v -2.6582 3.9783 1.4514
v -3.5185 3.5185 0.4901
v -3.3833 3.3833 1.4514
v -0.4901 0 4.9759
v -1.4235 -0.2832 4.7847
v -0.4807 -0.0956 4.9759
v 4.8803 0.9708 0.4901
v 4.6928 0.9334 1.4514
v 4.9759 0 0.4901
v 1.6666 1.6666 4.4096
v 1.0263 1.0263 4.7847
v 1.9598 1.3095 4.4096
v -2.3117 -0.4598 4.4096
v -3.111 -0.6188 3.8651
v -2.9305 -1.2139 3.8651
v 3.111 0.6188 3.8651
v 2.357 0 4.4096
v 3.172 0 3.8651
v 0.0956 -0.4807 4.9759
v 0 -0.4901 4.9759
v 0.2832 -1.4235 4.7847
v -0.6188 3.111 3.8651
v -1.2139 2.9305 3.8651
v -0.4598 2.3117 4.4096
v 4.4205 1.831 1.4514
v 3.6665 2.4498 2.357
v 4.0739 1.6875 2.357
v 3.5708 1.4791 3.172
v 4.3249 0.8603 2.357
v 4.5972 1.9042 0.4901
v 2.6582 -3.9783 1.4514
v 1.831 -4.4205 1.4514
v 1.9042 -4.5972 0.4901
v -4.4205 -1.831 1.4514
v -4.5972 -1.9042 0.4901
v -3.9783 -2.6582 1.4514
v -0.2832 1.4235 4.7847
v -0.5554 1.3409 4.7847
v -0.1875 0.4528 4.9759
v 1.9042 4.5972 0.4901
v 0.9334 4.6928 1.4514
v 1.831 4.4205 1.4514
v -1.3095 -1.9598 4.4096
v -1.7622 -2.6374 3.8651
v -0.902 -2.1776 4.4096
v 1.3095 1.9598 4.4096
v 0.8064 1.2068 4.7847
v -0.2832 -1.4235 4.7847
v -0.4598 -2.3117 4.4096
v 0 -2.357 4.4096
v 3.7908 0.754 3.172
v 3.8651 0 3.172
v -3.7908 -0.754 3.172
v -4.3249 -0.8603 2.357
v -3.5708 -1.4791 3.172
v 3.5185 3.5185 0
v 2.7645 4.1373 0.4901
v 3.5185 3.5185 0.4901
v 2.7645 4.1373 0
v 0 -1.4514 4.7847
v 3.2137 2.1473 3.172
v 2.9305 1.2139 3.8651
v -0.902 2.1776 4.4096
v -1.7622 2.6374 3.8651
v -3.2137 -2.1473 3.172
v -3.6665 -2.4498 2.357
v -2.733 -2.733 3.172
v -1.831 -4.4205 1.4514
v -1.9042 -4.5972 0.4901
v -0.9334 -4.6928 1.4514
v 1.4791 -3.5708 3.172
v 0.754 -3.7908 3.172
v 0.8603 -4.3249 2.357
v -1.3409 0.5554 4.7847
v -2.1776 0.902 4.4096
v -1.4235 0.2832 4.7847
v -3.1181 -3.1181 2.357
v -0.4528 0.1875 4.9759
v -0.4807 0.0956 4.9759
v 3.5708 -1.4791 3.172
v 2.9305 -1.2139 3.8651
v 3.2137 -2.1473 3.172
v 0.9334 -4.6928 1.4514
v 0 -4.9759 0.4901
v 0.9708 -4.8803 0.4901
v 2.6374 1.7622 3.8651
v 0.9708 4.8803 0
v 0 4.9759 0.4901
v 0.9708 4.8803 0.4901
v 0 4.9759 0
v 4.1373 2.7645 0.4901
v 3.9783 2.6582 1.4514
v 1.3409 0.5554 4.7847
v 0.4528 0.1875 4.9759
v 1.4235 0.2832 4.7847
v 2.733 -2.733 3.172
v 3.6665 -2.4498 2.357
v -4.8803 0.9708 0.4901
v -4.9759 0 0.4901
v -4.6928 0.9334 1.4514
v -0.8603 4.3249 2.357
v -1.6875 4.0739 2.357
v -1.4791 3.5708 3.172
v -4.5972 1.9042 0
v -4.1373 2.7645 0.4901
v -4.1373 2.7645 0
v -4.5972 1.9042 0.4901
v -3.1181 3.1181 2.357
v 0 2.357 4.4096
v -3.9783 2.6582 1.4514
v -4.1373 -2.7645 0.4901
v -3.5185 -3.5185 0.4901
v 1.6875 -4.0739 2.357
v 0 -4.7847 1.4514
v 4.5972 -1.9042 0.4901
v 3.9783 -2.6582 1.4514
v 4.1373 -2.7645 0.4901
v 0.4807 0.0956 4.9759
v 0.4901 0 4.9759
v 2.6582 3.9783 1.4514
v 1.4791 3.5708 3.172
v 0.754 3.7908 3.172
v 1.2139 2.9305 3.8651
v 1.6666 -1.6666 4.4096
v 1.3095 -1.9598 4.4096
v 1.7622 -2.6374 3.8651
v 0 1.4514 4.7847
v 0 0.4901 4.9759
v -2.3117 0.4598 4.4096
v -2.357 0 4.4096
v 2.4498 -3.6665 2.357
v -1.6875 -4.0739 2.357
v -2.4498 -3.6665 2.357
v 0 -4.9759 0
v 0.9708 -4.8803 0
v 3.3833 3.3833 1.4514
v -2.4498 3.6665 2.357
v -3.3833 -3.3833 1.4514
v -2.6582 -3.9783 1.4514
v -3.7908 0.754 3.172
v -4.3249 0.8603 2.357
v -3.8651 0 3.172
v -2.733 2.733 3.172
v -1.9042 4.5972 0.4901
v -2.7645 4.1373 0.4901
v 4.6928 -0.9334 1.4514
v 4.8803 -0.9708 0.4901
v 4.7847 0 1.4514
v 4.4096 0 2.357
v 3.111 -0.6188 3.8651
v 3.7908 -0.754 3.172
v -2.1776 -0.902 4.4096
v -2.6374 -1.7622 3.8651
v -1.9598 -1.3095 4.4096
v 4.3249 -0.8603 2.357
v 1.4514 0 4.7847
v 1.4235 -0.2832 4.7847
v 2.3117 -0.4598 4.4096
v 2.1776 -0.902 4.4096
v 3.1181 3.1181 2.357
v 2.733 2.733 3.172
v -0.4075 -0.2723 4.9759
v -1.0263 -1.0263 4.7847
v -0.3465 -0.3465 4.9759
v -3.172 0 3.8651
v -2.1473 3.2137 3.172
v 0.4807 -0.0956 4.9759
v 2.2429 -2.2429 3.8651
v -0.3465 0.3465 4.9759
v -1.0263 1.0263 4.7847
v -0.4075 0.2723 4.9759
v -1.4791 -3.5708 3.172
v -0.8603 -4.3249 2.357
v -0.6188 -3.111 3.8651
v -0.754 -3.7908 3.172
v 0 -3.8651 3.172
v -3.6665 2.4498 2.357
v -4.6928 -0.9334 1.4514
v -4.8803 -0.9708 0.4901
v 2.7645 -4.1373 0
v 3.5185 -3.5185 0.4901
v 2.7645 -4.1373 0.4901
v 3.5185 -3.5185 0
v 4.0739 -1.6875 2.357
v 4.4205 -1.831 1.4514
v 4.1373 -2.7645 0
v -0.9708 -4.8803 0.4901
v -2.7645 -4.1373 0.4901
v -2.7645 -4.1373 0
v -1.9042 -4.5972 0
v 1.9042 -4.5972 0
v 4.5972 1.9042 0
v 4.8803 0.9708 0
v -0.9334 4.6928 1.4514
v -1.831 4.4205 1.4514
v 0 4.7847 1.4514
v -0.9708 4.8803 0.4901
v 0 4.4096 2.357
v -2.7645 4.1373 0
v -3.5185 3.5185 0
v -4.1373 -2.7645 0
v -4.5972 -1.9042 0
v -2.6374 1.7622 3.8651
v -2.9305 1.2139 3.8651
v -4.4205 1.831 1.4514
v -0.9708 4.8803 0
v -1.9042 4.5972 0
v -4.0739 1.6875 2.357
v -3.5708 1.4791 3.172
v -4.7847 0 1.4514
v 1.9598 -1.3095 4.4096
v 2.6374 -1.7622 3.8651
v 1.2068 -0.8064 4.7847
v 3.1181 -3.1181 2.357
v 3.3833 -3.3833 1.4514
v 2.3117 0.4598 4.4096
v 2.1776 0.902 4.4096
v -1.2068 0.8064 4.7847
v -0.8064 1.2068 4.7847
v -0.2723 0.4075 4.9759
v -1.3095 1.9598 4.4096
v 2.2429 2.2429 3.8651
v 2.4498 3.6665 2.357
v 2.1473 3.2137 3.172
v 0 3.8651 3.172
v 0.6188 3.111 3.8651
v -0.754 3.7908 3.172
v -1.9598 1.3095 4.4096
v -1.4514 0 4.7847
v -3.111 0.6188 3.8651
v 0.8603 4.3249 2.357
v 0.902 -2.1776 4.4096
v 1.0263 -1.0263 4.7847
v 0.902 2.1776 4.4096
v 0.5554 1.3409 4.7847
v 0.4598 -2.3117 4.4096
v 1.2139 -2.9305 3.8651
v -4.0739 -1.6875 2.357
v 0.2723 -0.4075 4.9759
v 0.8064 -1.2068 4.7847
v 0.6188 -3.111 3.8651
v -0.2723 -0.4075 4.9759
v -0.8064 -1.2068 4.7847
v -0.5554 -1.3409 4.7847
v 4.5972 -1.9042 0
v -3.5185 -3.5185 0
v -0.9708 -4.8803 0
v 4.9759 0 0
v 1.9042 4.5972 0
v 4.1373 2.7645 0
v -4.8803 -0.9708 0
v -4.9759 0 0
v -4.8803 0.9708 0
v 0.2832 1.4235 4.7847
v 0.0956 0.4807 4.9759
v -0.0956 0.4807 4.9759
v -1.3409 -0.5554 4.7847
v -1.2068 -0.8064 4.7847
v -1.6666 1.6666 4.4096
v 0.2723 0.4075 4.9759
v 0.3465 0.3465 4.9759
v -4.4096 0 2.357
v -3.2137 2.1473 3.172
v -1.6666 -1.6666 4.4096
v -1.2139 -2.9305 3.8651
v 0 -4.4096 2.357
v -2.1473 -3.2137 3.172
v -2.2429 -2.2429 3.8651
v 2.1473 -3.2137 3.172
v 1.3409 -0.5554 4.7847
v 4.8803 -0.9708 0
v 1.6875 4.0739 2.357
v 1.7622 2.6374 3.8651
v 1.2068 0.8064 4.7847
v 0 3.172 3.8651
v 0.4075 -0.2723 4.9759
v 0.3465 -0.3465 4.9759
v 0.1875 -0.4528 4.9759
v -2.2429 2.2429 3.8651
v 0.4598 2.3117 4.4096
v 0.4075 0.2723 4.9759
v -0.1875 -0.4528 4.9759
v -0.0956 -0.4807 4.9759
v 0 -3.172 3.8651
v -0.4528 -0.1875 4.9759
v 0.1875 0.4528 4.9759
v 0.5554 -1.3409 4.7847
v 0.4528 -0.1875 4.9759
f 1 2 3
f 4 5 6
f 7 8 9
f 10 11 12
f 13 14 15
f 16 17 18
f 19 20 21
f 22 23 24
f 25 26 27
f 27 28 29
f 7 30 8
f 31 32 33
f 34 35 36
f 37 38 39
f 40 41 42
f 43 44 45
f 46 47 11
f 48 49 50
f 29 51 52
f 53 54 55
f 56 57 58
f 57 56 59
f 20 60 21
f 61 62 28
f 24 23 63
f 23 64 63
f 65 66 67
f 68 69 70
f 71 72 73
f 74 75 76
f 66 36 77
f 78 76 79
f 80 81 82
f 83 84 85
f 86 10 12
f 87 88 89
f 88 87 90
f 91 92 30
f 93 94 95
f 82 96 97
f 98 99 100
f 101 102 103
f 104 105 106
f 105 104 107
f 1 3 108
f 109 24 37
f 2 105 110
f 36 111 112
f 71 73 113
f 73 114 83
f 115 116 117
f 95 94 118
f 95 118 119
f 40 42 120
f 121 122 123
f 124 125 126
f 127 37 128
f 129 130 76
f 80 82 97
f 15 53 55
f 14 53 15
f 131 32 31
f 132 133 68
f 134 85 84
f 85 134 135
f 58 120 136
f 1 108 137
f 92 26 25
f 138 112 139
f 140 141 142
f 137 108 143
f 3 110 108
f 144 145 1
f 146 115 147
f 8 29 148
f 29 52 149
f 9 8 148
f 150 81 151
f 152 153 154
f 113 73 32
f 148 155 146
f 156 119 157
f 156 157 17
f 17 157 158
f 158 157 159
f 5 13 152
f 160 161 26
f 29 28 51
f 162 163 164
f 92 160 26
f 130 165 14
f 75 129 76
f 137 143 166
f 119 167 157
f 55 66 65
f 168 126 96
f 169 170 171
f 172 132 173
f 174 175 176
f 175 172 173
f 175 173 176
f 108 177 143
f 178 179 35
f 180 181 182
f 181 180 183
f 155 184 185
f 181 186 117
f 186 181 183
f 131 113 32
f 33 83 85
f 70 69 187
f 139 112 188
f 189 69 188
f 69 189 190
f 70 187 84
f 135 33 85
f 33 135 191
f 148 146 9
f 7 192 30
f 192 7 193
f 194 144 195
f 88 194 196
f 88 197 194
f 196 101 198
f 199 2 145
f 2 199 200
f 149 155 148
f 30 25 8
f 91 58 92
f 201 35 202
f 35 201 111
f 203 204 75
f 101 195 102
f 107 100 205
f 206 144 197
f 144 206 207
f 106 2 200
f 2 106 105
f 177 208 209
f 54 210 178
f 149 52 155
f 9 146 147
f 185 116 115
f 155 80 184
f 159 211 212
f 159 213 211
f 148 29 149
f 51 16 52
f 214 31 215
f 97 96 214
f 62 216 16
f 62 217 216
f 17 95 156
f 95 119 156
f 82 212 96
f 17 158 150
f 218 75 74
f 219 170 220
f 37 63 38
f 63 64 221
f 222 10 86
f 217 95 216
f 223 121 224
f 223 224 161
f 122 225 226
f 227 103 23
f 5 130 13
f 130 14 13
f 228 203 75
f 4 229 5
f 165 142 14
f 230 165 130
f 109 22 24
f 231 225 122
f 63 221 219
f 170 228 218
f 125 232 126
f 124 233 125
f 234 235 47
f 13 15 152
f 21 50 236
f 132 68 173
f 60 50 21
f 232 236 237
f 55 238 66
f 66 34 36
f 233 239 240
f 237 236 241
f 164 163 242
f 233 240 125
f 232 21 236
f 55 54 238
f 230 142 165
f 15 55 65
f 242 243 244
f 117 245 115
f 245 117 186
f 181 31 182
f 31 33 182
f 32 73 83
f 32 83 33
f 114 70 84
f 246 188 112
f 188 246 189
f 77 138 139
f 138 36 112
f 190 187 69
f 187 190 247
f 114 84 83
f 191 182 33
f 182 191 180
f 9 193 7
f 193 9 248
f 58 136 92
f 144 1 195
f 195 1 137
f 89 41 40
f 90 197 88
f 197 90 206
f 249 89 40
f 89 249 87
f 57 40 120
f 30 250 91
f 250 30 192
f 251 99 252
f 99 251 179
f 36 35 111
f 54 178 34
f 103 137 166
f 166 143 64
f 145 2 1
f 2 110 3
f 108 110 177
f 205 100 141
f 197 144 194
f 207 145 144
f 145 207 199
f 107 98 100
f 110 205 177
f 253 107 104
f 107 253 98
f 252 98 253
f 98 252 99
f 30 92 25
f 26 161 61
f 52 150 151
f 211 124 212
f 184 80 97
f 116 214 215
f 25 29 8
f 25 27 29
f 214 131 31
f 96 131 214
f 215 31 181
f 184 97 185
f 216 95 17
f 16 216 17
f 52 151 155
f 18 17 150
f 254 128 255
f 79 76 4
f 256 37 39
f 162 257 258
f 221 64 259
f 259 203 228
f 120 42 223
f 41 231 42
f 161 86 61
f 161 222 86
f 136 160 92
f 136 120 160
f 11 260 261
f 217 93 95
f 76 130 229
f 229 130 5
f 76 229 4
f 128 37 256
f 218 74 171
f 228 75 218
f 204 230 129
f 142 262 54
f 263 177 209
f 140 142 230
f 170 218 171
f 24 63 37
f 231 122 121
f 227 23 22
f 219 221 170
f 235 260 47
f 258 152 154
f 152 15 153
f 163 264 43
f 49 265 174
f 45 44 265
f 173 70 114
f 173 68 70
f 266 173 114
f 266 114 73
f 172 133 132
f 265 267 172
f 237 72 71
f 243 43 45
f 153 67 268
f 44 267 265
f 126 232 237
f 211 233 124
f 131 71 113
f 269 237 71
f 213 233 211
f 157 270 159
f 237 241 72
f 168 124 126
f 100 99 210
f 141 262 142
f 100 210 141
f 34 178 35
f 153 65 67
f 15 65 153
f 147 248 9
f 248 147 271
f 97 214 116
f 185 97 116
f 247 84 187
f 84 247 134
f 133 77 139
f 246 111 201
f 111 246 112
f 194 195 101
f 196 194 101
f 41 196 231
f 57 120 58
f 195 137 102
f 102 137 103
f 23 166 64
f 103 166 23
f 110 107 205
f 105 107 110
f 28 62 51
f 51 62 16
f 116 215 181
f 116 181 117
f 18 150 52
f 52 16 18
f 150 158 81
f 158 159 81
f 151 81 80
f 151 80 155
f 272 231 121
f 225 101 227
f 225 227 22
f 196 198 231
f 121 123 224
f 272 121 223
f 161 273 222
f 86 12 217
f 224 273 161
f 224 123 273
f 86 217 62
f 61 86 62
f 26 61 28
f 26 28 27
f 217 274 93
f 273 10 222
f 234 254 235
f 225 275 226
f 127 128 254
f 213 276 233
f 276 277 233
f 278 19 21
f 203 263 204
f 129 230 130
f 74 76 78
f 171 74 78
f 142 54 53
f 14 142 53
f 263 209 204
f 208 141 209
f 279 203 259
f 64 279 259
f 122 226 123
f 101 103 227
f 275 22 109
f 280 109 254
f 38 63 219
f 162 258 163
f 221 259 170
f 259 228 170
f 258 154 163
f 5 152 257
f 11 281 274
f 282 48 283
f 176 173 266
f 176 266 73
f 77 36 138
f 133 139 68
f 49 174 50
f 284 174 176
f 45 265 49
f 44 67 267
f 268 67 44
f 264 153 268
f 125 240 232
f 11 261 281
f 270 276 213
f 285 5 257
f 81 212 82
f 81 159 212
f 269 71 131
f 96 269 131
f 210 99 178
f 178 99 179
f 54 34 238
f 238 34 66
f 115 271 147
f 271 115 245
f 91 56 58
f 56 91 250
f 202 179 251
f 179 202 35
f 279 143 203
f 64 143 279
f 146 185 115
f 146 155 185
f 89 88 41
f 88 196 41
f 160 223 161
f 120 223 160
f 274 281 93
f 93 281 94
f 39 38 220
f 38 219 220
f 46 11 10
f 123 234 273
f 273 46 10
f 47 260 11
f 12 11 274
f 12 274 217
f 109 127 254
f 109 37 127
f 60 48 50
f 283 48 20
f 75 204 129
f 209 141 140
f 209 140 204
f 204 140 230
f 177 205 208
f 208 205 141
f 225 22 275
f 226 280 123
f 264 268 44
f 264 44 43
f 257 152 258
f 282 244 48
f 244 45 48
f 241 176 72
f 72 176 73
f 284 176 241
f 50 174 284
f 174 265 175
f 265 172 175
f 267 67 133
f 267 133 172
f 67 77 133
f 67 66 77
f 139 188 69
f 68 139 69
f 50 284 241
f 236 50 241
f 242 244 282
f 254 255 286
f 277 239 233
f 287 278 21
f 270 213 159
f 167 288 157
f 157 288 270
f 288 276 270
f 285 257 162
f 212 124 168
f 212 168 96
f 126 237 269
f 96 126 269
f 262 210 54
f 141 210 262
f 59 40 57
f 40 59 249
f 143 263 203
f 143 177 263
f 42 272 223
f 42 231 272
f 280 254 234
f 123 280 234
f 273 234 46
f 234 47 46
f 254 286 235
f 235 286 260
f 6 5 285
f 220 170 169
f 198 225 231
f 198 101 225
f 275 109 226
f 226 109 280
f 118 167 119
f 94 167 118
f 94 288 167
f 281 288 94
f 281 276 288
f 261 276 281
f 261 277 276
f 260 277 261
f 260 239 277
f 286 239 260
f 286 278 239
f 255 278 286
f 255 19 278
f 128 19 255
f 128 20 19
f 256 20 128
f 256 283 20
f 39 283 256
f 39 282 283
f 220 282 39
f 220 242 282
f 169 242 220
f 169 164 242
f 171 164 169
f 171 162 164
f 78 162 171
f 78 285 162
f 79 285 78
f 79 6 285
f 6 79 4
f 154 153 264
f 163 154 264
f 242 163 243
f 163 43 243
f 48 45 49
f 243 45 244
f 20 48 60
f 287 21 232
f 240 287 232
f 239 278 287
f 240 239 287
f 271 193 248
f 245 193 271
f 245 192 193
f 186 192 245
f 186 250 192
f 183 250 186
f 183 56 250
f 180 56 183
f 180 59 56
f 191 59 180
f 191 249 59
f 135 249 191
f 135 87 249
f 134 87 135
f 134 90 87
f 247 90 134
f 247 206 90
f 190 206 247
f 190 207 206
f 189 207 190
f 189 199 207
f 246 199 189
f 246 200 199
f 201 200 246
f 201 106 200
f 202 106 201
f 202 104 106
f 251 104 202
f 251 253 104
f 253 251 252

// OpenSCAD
$fn=32;

strapPip();

module strapPip() {
  intersection() {
    sphere(r=5);
    cylinder(r=5,h=5);
  }
}
